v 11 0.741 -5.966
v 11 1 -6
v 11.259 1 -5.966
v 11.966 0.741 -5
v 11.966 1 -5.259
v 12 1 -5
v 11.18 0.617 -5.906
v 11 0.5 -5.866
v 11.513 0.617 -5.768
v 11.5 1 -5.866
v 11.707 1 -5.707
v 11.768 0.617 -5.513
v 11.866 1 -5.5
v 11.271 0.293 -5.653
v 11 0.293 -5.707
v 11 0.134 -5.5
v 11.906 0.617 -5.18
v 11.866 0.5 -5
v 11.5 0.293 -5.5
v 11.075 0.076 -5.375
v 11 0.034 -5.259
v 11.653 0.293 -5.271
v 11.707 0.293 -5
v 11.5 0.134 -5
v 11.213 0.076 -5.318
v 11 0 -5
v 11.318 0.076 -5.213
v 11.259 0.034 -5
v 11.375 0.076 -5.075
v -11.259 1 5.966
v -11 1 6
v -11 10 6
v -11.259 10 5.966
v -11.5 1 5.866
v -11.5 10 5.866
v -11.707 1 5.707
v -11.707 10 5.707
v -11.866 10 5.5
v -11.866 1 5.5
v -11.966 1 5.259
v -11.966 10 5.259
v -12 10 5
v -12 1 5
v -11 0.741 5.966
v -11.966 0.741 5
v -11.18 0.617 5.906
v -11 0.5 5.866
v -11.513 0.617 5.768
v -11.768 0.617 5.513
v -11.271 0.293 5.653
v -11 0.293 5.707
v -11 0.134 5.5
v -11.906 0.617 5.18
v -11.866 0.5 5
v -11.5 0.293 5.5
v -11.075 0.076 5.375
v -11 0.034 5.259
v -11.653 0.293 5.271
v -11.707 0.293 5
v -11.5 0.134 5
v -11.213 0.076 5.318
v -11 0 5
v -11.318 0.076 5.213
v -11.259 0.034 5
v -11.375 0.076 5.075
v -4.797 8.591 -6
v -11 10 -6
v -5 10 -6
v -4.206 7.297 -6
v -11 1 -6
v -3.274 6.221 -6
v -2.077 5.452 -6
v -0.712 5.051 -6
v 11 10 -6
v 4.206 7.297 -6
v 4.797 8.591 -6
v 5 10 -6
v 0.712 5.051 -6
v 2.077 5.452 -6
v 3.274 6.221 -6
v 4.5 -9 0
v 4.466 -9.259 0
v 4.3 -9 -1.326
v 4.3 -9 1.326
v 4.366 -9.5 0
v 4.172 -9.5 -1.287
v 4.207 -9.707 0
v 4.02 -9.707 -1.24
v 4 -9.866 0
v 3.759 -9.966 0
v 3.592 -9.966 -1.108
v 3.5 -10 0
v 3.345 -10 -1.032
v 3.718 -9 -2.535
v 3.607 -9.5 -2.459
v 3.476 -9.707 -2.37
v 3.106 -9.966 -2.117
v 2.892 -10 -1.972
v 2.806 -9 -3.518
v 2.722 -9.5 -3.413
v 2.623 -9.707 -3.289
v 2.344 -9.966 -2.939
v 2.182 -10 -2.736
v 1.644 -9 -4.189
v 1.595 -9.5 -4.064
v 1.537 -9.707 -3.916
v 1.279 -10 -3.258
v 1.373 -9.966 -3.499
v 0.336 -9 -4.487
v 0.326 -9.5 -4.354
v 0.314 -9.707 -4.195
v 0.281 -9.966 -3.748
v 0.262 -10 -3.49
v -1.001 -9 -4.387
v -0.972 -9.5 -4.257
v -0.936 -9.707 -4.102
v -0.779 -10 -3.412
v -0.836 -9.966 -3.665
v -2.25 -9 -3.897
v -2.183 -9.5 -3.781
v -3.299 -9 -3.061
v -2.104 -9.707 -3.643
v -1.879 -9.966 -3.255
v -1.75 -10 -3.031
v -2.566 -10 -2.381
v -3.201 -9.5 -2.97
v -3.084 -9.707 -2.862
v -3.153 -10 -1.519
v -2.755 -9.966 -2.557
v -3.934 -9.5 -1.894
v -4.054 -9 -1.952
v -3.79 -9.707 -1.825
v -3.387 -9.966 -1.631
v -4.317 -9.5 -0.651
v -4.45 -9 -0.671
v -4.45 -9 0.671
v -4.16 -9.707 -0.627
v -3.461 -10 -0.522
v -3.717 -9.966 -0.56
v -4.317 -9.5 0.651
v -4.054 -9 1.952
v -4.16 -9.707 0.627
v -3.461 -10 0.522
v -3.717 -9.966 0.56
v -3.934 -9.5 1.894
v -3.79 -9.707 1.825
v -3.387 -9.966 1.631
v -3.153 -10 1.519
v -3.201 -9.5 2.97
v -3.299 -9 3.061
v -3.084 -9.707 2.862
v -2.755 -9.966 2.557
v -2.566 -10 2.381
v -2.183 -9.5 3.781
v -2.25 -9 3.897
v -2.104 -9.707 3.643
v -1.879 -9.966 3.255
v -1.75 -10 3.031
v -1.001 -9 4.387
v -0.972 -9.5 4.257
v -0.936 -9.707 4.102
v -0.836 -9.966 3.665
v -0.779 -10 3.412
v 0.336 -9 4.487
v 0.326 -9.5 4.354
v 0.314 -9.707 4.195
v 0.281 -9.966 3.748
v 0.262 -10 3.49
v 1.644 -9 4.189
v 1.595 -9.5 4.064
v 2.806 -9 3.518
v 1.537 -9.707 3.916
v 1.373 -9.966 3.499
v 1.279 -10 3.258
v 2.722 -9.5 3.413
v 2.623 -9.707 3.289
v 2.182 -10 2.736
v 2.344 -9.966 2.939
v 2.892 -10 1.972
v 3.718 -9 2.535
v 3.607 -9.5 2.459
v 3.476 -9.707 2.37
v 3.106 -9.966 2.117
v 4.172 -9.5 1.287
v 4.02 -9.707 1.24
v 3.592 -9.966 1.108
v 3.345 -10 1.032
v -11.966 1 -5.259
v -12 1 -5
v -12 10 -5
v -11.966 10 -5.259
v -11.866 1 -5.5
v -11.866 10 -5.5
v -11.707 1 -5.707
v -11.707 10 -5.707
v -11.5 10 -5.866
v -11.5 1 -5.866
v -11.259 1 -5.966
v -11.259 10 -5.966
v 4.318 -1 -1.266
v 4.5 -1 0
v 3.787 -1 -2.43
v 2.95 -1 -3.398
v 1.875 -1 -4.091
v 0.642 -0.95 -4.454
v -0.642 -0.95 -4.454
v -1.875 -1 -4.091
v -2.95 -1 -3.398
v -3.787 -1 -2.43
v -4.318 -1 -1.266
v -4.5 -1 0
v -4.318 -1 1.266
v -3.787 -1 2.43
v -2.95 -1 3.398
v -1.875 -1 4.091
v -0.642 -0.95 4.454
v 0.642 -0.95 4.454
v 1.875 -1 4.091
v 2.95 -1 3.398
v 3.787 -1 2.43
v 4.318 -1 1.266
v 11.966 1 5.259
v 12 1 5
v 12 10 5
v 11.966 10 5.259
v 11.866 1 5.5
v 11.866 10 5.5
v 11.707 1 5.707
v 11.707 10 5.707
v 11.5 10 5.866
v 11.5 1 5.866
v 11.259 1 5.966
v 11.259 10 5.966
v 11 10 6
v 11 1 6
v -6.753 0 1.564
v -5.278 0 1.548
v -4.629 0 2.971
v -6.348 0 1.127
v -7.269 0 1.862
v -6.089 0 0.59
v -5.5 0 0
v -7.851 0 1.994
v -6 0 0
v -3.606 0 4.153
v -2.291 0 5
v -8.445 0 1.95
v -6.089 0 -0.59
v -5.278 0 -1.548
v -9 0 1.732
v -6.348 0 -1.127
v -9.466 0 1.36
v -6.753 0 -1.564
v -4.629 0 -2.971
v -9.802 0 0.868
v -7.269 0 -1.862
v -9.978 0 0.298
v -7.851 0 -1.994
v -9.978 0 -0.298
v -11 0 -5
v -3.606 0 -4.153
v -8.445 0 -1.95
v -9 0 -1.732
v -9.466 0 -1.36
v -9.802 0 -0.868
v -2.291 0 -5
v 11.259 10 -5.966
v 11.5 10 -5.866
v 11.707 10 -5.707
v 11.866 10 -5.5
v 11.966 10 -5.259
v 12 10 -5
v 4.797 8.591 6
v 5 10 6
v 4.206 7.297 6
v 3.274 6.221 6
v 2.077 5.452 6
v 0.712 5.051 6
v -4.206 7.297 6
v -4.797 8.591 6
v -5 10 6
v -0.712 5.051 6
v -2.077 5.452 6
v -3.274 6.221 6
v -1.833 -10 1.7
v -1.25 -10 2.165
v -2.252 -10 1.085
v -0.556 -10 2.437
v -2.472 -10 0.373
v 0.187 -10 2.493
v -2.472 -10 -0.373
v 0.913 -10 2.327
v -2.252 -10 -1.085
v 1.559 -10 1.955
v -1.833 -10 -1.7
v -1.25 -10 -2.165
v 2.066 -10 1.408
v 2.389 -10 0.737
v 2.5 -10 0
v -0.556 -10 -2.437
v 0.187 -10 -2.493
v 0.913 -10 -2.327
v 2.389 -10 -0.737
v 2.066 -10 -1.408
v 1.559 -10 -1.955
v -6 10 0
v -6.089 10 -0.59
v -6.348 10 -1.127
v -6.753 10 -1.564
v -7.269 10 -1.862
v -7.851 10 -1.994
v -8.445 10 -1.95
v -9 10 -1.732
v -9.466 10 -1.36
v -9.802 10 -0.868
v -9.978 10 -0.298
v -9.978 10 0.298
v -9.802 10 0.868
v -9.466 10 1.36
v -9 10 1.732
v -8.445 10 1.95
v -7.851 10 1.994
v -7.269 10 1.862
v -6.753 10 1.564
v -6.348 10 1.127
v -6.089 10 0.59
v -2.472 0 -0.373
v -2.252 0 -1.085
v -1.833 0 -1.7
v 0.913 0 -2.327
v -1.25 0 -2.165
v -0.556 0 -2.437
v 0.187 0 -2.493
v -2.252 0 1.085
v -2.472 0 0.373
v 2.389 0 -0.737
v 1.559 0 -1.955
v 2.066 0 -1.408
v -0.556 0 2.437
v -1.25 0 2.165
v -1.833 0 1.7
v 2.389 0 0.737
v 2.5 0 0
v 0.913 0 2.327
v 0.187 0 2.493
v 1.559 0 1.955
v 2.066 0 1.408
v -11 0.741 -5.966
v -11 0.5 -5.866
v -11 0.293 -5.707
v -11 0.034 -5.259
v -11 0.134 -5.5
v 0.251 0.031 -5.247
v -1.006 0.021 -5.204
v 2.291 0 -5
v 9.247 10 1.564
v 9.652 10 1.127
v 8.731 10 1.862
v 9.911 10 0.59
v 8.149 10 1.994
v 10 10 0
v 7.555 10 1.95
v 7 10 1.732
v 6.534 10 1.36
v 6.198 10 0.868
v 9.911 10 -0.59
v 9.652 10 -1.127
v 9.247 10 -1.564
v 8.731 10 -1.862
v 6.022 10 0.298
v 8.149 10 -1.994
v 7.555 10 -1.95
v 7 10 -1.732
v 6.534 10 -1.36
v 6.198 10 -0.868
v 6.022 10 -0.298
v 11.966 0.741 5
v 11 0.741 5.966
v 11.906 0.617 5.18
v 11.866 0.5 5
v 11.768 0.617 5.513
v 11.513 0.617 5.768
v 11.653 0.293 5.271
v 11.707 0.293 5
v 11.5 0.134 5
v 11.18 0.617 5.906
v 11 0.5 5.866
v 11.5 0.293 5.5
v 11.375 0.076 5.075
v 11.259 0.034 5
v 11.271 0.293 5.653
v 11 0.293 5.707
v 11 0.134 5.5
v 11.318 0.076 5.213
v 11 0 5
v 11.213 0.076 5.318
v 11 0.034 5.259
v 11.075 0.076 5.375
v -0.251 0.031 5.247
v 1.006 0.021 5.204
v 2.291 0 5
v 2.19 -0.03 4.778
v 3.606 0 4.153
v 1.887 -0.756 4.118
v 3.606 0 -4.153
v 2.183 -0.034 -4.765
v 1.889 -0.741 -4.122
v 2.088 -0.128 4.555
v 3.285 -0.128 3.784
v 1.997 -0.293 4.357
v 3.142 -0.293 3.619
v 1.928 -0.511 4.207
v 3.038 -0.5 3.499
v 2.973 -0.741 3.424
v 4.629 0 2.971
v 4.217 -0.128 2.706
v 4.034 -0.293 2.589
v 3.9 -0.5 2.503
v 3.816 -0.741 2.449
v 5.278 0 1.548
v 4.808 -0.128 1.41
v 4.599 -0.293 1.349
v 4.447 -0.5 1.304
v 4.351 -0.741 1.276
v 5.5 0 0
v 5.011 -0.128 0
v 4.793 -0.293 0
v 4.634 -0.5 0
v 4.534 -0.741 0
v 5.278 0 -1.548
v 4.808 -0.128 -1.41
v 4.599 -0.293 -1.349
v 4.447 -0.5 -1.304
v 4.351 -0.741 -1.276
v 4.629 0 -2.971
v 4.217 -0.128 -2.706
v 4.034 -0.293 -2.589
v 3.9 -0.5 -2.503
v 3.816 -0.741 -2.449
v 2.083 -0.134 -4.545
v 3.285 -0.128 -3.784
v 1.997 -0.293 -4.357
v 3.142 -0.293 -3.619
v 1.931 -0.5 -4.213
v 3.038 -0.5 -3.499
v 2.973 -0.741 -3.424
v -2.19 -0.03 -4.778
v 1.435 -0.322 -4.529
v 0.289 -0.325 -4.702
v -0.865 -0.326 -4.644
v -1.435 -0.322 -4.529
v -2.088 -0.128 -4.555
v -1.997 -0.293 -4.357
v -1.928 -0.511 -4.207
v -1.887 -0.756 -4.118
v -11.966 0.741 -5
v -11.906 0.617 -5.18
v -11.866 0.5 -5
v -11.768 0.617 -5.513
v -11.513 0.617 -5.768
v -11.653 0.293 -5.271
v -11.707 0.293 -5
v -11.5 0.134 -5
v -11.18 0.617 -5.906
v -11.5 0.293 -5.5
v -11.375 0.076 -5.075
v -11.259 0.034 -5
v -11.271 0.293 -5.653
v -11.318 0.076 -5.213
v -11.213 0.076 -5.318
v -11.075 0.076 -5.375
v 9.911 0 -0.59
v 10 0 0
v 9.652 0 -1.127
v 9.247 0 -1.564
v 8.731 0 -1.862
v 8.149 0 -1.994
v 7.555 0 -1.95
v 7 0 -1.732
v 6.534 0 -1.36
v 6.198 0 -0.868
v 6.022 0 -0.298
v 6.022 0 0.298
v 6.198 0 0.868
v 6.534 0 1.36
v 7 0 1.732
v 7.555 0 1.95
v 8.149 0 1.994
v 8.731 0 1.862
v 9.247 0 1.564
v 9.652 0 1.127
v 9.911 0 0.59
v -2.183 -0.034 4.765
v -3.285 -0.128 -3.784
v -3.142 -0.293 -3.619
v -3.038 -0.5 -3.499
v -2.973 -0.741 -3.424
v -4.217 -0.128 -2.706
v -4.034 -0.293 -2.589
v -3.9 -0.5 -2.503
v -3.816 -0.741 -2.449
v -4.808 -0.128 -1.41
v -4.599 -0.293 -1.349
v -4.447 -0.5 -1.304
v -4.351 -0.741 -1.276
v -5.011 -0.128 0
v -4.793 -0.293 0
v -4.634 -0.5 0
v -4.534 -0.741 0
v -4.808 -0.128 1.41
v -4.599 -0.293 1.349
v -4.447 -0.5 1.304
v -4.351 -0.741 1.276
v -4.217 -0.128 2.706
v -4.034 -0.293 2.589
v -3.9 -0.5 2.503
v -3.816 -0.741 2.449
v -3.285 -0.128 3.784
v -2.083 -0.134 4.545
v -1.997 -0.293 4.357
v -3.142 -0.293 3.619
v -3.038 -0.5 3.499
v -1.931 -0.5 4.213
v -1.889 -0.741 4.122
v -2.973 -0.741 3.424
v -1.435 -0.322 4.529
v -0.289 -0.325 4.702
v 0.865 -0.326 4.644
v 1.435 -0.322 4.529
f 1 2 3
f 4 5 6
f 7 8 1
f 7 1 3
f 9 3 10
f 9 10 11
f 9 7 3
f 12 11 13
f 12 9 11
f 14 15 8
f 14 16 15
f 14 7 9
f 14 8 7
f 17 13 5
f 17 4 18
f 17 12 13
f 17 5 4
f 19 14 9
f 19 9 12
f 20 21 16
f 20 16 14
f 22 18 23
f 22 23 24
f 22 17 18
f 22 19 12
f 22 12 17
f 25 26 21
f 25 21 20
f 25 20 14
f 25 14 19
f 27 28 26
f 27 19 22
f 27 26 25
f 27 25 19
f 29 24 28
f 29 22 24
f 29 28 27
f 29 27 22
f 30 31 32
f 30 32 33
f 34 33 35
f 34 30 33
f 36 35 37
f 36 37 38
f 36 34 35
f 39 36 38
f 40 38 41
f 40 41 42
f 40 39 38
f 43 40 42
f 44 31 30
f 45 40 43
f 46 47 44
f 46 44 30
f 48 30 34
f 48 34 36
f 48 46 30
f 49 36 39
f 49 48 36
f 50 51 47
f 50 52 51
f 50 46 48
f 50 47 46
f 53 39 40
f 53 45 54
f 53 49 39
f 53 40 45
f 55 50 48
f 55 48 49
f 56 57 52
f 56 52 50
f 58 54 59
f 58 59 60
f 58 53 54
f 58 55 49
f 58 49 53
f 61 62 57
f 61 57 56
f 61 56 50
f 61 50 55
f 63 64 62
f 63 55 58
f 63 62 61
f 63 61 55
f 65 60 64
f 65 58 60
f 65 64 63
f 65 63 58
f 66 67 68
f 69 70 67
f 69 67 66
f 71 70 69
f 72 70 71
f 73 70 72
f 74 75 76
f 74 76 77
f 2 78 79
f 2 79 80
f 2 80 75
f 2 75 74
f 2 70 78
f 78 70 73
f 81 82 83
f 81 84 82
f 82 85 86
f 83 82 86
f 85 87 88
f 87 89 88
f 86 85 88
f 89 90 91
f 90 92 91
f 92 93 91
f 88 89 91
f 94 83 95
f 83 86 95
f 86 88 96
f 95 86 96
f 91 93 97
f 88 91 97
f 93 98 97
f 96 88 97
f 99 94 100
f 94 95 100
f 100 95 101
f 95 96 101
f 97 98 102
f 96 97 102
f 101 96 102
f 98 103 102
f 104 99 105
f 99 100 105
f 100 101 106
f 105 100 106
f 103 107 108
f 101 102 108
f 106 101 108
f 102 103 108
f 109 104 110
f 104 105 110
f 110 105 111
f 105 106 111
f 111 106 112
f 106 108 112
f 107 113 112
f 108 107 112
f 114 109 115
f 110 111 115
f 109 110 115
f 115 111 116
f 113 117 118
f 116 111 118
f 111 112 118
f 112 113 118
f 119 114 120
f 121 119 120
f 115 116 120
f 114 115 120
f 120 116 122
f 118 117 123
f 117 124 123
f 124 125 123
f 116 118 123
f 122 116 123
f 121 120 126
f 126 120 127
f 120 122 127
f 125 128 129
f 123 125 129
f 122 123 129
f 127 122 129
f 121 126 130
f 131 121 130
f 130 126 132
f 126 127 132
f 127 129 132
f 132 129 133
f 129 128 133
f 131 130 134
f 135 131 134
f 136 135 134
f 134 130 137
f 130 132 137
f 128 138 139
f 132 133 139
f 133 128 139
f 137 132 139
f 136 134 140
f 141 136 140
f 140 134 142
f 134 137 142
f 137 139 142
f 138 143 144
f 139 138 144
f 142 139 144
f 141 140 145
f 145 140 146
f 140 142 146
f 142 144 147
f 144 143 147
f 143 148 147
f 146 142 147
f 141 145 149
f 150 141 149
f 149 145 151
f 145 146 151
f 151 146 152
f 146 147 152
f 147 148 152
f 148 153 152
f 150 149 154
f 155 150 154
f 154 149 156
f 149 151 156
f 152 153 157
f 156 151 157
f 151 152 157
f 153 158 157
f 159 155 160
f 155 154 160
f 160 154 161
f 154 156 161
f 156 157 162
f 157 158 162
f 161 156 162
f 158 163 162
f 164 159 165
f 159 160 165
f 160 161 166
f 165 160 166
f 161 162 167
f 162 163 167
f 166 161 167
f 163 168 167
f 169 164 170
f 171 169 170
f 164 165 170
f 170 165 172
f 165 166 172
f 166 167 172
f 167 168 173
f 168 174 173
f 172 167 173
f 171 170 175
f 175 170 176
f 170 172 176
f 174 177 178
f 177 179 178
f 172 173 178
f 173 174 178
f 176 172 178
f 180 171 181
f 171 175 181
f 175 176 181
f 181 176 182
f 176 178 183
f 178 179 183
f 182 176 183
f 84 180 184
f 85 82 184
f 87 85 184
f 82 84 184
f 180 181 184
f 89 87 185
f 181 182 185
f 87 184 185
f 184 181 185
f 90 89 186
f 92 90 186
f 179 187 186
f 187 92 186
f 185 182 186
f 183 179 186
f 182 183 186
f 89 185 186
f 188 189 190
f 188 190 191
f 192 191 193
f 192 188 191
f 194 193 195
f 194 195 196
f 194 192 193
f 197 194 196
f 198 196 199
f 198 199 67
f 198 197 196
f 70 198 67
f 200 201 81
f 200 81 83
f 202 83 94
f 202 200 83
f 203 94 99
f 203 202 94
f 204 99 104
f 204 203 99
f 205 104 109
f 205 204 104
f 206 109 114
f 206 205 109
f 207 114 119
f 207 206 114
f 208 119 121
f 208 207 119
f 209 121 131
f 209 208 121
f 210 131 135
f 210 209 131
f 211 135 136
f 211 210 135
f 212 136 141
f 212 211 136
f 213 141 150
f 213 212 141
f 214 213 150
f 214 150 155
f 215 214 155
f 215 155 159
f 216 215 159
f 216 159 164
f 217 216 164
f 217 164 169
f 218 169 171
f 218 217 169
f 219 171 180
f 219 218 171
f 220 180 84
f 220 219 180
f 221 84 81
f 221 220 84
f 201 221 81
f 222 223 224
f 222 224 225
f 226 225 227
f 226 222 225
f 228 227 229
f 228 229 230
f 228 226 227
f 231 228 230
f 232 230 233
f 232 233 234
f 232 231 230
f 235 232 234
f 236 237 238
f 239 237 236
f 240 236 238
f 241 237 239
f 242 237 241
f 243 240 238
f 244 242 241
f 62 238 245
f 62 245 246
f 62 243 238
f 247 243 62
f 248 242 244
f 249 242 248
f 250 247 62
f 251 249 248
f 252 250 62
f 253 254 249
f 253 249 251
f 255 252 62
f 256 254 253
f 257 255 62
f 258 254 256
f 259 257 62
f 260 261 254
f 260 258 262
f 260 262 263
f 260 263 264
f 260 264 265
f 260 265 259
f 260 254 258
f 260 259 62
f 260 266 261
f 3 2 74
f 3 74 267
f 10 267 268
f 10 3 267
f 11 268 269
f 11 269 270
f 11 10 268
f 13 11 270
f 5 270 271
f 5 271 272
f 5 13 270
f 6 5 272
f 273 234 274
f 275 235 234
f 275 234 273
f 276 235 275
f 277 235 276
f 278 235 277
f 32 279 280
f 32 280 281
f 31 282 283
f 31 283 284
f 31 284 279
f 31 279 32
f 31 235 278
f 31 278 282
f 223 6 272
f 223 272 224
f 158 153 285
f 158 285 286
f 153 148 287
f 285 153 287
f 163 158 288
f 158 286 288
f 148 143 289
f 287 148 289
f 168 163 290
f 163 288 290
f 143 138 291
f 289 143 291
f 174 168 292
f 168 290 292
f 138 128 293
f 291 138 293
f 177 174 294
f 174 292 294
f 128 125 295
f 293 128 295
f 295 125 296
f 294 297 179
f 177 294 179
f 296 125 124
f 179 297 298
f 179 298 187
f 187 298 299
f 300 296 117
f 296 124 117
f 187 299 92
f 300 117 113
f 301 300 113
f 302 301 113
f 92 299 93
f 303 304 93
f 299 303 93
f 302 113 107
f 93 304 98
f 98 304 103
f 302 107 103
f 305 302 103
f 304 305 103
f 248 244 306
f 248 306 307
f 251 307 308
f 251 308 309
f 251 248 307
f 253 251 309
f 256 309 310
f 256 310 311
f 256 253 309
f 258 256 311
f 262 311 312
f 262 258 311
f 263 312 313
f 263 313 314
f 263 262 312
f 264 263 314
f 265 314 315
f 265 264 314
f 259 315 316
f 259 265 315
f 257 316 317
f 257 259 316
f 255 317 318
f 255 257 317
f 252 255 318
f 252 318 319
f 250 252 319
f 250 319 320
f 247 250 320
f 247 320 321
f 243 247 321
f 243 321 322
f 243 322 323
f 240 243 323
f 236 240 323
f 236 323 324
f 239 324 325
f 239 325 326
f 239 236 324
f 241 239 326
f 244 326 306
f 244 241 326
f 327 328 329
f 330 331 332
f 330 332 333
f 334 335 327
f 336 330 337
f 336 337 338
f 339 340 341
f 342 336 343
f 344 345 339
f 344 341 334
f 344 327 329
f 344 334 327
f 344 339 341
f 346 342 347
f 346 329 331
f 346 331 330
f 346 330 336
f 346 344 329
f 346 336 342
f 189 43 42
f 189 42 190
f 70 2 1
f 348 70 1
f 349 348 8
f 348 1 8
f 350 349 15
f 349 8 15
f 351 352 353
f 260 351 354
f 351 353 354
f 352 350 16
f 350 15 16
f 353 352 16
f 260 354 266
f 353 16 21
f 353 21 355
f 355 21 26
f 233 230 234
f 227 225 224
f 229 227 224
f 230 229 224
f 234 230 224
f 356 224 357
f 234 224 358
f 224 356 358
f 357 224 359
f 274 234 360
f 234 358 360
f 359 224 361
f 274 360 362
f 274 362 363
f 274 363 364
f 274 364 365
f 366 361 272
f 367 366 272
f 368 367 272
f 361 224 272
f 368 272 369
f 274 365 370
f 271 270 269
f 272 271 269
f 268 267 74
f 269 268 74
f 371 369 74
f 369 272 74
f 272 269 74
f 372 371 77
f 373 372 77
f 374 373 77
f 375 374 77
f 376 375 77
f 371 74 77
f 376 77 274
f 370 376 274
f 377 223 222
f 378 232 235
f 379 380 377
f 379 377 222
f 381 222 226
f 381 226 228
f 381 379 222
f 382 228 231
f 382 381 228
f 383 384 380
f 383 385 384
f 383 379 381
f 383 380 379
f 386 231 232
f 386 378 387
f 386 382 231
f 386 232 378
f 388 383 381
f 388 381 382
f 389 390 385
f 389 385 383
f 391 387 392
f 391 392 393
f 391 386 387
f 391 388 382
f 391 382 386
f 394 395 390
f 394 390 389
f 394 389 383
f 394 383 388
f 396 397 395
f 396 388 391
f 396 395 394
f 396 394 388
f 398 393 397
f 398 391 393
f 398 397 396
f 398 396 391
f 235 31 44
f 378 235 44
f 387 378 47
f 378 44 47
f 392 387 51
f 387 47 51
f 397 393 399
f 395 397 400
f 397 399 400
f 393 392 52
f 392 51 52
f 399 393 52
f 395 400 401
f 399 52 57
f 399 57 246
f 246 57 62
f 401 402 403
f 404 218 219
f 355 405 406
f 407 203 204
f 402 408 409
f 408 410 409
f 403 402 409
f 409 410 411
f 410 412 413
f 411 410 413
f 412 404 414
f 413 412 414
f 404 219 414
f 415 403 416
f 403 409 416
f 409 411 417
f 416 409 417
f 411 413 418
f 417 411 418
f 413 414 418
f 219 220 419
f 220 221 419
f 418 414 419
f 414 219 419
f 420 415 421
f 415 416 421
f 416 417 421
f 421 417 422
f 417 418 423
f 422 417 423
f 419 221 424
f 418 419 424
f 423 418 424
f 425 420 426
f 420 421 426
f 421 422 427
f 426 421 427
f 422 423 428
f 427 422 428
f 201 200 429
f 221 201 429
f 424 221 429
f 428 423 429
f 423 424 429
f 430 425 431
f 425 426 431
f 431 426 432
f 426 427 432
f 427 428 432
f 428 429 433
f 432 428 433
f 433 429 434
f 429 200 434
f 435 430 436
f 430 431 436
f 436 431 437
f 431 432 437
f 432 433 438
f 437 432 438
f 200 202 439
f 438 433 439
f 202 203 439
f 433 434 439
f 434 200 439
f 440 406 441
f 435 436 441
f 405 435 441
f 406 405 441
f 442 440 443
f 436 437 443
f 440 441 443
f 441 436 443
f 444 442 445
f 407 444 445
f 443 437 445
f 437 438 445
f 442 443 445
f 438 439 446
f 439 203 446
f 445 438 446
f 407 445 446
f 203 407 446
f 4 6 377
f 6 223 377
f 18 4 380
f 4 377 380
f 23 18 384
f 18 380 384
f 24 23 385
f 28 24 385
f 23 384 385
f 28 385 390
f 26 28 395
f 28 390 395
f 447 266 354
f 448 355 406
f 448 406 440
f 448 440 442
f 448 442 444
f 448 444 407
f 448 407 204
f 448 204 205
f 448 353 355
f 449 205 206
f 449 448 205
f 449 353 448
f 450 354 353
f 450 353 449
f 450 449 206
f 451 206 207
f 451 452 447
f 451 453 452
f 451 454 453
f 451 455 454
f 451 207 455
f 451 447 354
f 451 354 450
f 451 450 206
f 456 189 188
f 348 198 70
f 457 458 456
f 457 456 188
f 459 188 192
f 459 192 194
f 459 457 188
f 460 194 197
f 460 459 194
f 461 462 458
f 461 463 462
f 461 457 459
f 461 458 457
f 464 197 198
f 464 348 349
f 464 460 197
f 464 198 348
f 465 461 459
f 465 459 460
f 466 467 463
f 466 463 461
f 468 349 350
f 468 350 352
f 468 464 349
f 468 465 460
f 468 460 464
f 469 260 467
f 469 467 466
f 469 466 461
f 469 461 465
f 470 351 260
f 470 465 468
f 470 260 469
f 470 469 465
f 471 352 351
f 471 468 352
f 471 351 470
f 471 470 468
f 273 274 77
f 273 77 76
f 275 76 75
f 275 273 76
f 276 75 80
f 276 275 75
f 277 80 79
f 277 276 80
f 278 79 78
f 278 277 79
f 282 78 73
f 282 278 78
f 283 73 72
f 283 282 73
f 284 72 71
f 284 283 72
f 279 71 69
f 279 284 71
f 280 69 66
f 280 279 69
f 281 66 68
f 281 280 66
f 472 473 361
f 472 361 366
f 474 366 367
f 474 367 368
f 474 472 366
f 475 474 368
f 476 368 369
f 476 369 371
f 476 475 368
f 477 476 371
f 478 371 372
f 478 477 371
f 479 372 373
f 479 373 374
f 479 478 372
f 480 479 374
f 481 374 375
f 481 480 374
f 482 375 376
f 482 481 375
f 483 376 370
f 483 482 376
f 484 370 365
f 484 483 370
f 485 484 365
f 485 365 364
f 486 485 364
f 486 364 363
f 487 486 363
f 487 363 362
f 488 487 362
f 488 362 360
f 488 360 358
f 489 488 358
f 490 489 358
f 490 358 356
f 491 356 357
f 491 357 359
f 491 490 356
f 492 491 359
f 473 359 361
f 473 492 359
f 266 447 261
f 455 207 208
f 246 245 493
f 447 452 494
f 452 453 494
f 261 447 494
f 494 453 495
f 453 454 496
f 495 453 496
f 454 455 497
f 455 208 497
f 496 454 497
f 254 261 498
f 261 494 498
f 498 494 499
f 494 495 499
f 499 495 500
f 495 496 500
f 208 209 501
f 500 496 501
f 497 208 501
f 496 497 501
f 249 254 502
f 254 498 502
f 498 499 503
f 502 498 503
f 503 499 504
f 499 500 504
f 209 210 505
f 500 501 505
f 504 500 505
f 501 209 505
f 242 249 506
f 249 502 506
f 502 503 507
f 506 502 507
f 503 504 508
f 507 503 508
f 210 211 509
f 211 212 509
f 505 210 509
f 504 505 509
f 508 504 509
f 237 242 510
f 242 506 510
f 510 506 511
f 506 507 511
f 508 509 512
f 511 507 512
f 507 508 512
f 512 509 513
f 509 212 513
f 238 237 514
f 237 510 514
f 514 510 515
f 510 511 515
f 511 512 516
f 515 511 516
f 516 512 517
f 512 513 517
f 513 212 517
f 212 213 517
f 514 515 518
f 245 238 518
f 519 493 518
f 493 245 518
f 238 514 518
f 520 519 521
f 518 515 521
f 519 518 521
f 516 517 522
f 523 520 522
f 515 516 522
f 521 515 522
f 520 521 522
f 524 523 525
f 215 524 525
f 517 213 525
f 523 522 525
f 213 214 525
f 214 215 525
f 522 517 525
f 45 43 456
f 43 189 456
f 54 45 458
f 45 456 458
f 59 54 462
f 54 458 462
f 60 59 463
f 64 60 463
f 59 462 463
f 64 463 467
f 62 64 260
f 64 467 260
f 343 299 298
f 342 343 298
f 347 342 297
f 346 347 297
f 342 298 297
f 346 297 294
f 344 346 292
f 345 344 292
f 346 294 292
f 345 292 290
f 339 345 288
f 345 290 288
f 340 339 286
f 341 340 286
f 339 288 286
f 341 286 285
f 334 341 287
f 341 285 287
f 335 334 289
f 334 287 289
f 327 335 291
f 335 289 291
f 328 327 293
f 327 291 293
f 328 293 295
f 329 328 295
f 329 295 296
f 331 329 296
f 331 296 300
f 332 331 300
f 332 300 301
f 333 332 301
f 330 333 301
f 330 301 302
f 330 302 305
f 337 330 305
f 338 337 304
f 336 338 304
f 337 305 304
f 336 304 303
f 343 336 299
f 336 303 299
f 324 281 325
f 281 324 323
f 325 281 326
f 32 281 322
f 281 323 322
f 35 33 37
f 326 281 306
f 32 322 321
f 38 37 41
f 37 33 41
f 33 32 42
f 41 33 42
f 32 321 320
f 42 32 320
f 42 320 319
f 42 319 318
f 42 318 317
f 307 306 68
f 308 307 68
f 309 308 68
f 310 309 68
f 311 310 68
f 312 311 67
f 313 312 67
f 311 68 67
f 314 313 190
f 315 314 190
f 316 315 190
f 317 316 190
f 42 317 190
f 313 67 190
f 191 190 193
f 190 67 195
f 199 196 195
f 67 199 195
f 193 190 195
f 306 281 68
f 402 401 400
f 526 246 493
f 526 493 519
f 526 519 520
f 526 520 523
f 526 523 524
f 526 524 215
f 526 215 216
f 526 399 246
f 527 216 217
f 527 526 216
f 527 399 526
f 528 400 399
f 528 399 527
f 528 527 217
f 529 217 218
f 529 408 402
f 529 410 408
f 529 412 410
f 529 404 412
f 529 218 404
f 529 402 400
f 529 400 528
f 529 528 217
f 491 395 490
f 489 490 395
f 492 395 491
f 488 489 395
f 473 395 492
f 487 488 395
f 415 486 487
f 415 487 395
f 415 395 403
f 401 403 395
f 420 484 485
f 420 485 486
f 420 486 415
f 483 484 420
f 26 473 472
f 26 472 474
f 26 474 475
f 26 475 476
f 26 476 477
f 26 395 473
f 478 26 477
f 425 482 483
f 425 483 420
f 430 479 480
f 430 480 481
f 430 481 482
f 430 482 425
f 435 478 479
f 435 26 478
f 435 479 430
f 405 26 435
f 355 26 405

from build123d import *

# Parameters (mm, degrees)
SKETCH1_R           = 2
BOSS_EXTRUDE1_DEPTH = 10
SKETCH1_3_R         = 4.5
BOSS_EXTRUDE2_DEPTH = 10
CUT_EXTRUDE1_DEPTH  = 20.697715604
FILLET1_R           = 1
FILLET2_R           = 1
SKETCH3_R           = 2.5
CUT_EXTRUDE2_DEPTH  = 10


with BuildPart() as part:
    # Sketch1 → Boss-Extrude1 (new body)
    with BuildSketch(Plane(origin=(0, 0, 0), x_dir=(1, 0, 0), z_dir=(0, 1, 0))):
        with BuildLine():
            ThreePointArc((-12, -5), (-11.707106781, -5.707106781), (-11, -6))
            Line((-11, -6), (11, -6))
            ThreePointArc((11, -6), (11.707106781, -5.707106781), (12, -5))
            Line((12, -5), (12, 5))
            ThreePointArc((12, 5), (11.707106781, 5.707106781), (11, 6))
            Line((11, 6), (-11, 6))
            ThreePointArc((-11, 6), (-11.707106781, 5.707106781), (-12, 5))
            Line((-12, 5), (-12, -5))
        make_face()
        with Locations((-8, 0)):
            Circle(SKETCH1_R, mode=Mode.SUBTRACT)
        with Locations((8, 0)):
            Circle(SKETCH1_R, mode=Mode.SUBTRACT)
    extrude(amount=BOSS_EXTRUDE1_DEPTH)

    # Sketch1<3> → Boss-Extrude2 (add)
    with BuildSketch(Plane(origin=(0, 0, 0), x_dir=(1, 0, 0), z_dir=(0, 1, 0))):
        Circle(SKETCH1_3_R)
    extrude(amount=-BOSS_EXTRUDE2_DEPTH)

    # Sketch2 → Cut-Extrude1 (cut, through all)
    with BuildSketch(Plane.XY.offset(6)):
        with BuildLine():
            Line((-5, 10), (5, 10))
            ThreePointArc((5, 10), (0, 5), (-5, 10))
        make_face()
    extrude(amount=-CUT_EXTRUDE1_DEPTH, mode=Mode.SUBTRACT)

    # Fillet1
    fillet1_edges = [part.edges().sort_by_distance(p)[0] for p in [
        (-11.707106781, 0, 5.707106781),
        (-12, 0, 0),
        (-11.707106781, 0, -5.707106781),
        (0, 0, -6),
        (11.707106781, 0, -5.707106781),
        (12, 0, 0),
        (11.707106781, 0, 5.707106781),
        (-4.5, -10, 0),
        (0, 0, 6),
    ]]
    fillet(fillet1_edges, radius=FILLET1_R)

    # Fillet2
    fillet2_edges = [part.edges().sort_by_distance(p)[0] for p in [
        (-4.5, 0, 0),
    ]]
    fillet(fillet2_edges, radius=FILLET2_R)

    # Sketch3 → Cut-Extrude2 (cut)
    with BuildSketch(Plane.XZ.offset(10)):
        Circle(SKETCH3_R)
    extrude(amount=-CUT_EXTRUDE2_DEPTH, mode=Mode.SUBTRACT)


solid = part.part
